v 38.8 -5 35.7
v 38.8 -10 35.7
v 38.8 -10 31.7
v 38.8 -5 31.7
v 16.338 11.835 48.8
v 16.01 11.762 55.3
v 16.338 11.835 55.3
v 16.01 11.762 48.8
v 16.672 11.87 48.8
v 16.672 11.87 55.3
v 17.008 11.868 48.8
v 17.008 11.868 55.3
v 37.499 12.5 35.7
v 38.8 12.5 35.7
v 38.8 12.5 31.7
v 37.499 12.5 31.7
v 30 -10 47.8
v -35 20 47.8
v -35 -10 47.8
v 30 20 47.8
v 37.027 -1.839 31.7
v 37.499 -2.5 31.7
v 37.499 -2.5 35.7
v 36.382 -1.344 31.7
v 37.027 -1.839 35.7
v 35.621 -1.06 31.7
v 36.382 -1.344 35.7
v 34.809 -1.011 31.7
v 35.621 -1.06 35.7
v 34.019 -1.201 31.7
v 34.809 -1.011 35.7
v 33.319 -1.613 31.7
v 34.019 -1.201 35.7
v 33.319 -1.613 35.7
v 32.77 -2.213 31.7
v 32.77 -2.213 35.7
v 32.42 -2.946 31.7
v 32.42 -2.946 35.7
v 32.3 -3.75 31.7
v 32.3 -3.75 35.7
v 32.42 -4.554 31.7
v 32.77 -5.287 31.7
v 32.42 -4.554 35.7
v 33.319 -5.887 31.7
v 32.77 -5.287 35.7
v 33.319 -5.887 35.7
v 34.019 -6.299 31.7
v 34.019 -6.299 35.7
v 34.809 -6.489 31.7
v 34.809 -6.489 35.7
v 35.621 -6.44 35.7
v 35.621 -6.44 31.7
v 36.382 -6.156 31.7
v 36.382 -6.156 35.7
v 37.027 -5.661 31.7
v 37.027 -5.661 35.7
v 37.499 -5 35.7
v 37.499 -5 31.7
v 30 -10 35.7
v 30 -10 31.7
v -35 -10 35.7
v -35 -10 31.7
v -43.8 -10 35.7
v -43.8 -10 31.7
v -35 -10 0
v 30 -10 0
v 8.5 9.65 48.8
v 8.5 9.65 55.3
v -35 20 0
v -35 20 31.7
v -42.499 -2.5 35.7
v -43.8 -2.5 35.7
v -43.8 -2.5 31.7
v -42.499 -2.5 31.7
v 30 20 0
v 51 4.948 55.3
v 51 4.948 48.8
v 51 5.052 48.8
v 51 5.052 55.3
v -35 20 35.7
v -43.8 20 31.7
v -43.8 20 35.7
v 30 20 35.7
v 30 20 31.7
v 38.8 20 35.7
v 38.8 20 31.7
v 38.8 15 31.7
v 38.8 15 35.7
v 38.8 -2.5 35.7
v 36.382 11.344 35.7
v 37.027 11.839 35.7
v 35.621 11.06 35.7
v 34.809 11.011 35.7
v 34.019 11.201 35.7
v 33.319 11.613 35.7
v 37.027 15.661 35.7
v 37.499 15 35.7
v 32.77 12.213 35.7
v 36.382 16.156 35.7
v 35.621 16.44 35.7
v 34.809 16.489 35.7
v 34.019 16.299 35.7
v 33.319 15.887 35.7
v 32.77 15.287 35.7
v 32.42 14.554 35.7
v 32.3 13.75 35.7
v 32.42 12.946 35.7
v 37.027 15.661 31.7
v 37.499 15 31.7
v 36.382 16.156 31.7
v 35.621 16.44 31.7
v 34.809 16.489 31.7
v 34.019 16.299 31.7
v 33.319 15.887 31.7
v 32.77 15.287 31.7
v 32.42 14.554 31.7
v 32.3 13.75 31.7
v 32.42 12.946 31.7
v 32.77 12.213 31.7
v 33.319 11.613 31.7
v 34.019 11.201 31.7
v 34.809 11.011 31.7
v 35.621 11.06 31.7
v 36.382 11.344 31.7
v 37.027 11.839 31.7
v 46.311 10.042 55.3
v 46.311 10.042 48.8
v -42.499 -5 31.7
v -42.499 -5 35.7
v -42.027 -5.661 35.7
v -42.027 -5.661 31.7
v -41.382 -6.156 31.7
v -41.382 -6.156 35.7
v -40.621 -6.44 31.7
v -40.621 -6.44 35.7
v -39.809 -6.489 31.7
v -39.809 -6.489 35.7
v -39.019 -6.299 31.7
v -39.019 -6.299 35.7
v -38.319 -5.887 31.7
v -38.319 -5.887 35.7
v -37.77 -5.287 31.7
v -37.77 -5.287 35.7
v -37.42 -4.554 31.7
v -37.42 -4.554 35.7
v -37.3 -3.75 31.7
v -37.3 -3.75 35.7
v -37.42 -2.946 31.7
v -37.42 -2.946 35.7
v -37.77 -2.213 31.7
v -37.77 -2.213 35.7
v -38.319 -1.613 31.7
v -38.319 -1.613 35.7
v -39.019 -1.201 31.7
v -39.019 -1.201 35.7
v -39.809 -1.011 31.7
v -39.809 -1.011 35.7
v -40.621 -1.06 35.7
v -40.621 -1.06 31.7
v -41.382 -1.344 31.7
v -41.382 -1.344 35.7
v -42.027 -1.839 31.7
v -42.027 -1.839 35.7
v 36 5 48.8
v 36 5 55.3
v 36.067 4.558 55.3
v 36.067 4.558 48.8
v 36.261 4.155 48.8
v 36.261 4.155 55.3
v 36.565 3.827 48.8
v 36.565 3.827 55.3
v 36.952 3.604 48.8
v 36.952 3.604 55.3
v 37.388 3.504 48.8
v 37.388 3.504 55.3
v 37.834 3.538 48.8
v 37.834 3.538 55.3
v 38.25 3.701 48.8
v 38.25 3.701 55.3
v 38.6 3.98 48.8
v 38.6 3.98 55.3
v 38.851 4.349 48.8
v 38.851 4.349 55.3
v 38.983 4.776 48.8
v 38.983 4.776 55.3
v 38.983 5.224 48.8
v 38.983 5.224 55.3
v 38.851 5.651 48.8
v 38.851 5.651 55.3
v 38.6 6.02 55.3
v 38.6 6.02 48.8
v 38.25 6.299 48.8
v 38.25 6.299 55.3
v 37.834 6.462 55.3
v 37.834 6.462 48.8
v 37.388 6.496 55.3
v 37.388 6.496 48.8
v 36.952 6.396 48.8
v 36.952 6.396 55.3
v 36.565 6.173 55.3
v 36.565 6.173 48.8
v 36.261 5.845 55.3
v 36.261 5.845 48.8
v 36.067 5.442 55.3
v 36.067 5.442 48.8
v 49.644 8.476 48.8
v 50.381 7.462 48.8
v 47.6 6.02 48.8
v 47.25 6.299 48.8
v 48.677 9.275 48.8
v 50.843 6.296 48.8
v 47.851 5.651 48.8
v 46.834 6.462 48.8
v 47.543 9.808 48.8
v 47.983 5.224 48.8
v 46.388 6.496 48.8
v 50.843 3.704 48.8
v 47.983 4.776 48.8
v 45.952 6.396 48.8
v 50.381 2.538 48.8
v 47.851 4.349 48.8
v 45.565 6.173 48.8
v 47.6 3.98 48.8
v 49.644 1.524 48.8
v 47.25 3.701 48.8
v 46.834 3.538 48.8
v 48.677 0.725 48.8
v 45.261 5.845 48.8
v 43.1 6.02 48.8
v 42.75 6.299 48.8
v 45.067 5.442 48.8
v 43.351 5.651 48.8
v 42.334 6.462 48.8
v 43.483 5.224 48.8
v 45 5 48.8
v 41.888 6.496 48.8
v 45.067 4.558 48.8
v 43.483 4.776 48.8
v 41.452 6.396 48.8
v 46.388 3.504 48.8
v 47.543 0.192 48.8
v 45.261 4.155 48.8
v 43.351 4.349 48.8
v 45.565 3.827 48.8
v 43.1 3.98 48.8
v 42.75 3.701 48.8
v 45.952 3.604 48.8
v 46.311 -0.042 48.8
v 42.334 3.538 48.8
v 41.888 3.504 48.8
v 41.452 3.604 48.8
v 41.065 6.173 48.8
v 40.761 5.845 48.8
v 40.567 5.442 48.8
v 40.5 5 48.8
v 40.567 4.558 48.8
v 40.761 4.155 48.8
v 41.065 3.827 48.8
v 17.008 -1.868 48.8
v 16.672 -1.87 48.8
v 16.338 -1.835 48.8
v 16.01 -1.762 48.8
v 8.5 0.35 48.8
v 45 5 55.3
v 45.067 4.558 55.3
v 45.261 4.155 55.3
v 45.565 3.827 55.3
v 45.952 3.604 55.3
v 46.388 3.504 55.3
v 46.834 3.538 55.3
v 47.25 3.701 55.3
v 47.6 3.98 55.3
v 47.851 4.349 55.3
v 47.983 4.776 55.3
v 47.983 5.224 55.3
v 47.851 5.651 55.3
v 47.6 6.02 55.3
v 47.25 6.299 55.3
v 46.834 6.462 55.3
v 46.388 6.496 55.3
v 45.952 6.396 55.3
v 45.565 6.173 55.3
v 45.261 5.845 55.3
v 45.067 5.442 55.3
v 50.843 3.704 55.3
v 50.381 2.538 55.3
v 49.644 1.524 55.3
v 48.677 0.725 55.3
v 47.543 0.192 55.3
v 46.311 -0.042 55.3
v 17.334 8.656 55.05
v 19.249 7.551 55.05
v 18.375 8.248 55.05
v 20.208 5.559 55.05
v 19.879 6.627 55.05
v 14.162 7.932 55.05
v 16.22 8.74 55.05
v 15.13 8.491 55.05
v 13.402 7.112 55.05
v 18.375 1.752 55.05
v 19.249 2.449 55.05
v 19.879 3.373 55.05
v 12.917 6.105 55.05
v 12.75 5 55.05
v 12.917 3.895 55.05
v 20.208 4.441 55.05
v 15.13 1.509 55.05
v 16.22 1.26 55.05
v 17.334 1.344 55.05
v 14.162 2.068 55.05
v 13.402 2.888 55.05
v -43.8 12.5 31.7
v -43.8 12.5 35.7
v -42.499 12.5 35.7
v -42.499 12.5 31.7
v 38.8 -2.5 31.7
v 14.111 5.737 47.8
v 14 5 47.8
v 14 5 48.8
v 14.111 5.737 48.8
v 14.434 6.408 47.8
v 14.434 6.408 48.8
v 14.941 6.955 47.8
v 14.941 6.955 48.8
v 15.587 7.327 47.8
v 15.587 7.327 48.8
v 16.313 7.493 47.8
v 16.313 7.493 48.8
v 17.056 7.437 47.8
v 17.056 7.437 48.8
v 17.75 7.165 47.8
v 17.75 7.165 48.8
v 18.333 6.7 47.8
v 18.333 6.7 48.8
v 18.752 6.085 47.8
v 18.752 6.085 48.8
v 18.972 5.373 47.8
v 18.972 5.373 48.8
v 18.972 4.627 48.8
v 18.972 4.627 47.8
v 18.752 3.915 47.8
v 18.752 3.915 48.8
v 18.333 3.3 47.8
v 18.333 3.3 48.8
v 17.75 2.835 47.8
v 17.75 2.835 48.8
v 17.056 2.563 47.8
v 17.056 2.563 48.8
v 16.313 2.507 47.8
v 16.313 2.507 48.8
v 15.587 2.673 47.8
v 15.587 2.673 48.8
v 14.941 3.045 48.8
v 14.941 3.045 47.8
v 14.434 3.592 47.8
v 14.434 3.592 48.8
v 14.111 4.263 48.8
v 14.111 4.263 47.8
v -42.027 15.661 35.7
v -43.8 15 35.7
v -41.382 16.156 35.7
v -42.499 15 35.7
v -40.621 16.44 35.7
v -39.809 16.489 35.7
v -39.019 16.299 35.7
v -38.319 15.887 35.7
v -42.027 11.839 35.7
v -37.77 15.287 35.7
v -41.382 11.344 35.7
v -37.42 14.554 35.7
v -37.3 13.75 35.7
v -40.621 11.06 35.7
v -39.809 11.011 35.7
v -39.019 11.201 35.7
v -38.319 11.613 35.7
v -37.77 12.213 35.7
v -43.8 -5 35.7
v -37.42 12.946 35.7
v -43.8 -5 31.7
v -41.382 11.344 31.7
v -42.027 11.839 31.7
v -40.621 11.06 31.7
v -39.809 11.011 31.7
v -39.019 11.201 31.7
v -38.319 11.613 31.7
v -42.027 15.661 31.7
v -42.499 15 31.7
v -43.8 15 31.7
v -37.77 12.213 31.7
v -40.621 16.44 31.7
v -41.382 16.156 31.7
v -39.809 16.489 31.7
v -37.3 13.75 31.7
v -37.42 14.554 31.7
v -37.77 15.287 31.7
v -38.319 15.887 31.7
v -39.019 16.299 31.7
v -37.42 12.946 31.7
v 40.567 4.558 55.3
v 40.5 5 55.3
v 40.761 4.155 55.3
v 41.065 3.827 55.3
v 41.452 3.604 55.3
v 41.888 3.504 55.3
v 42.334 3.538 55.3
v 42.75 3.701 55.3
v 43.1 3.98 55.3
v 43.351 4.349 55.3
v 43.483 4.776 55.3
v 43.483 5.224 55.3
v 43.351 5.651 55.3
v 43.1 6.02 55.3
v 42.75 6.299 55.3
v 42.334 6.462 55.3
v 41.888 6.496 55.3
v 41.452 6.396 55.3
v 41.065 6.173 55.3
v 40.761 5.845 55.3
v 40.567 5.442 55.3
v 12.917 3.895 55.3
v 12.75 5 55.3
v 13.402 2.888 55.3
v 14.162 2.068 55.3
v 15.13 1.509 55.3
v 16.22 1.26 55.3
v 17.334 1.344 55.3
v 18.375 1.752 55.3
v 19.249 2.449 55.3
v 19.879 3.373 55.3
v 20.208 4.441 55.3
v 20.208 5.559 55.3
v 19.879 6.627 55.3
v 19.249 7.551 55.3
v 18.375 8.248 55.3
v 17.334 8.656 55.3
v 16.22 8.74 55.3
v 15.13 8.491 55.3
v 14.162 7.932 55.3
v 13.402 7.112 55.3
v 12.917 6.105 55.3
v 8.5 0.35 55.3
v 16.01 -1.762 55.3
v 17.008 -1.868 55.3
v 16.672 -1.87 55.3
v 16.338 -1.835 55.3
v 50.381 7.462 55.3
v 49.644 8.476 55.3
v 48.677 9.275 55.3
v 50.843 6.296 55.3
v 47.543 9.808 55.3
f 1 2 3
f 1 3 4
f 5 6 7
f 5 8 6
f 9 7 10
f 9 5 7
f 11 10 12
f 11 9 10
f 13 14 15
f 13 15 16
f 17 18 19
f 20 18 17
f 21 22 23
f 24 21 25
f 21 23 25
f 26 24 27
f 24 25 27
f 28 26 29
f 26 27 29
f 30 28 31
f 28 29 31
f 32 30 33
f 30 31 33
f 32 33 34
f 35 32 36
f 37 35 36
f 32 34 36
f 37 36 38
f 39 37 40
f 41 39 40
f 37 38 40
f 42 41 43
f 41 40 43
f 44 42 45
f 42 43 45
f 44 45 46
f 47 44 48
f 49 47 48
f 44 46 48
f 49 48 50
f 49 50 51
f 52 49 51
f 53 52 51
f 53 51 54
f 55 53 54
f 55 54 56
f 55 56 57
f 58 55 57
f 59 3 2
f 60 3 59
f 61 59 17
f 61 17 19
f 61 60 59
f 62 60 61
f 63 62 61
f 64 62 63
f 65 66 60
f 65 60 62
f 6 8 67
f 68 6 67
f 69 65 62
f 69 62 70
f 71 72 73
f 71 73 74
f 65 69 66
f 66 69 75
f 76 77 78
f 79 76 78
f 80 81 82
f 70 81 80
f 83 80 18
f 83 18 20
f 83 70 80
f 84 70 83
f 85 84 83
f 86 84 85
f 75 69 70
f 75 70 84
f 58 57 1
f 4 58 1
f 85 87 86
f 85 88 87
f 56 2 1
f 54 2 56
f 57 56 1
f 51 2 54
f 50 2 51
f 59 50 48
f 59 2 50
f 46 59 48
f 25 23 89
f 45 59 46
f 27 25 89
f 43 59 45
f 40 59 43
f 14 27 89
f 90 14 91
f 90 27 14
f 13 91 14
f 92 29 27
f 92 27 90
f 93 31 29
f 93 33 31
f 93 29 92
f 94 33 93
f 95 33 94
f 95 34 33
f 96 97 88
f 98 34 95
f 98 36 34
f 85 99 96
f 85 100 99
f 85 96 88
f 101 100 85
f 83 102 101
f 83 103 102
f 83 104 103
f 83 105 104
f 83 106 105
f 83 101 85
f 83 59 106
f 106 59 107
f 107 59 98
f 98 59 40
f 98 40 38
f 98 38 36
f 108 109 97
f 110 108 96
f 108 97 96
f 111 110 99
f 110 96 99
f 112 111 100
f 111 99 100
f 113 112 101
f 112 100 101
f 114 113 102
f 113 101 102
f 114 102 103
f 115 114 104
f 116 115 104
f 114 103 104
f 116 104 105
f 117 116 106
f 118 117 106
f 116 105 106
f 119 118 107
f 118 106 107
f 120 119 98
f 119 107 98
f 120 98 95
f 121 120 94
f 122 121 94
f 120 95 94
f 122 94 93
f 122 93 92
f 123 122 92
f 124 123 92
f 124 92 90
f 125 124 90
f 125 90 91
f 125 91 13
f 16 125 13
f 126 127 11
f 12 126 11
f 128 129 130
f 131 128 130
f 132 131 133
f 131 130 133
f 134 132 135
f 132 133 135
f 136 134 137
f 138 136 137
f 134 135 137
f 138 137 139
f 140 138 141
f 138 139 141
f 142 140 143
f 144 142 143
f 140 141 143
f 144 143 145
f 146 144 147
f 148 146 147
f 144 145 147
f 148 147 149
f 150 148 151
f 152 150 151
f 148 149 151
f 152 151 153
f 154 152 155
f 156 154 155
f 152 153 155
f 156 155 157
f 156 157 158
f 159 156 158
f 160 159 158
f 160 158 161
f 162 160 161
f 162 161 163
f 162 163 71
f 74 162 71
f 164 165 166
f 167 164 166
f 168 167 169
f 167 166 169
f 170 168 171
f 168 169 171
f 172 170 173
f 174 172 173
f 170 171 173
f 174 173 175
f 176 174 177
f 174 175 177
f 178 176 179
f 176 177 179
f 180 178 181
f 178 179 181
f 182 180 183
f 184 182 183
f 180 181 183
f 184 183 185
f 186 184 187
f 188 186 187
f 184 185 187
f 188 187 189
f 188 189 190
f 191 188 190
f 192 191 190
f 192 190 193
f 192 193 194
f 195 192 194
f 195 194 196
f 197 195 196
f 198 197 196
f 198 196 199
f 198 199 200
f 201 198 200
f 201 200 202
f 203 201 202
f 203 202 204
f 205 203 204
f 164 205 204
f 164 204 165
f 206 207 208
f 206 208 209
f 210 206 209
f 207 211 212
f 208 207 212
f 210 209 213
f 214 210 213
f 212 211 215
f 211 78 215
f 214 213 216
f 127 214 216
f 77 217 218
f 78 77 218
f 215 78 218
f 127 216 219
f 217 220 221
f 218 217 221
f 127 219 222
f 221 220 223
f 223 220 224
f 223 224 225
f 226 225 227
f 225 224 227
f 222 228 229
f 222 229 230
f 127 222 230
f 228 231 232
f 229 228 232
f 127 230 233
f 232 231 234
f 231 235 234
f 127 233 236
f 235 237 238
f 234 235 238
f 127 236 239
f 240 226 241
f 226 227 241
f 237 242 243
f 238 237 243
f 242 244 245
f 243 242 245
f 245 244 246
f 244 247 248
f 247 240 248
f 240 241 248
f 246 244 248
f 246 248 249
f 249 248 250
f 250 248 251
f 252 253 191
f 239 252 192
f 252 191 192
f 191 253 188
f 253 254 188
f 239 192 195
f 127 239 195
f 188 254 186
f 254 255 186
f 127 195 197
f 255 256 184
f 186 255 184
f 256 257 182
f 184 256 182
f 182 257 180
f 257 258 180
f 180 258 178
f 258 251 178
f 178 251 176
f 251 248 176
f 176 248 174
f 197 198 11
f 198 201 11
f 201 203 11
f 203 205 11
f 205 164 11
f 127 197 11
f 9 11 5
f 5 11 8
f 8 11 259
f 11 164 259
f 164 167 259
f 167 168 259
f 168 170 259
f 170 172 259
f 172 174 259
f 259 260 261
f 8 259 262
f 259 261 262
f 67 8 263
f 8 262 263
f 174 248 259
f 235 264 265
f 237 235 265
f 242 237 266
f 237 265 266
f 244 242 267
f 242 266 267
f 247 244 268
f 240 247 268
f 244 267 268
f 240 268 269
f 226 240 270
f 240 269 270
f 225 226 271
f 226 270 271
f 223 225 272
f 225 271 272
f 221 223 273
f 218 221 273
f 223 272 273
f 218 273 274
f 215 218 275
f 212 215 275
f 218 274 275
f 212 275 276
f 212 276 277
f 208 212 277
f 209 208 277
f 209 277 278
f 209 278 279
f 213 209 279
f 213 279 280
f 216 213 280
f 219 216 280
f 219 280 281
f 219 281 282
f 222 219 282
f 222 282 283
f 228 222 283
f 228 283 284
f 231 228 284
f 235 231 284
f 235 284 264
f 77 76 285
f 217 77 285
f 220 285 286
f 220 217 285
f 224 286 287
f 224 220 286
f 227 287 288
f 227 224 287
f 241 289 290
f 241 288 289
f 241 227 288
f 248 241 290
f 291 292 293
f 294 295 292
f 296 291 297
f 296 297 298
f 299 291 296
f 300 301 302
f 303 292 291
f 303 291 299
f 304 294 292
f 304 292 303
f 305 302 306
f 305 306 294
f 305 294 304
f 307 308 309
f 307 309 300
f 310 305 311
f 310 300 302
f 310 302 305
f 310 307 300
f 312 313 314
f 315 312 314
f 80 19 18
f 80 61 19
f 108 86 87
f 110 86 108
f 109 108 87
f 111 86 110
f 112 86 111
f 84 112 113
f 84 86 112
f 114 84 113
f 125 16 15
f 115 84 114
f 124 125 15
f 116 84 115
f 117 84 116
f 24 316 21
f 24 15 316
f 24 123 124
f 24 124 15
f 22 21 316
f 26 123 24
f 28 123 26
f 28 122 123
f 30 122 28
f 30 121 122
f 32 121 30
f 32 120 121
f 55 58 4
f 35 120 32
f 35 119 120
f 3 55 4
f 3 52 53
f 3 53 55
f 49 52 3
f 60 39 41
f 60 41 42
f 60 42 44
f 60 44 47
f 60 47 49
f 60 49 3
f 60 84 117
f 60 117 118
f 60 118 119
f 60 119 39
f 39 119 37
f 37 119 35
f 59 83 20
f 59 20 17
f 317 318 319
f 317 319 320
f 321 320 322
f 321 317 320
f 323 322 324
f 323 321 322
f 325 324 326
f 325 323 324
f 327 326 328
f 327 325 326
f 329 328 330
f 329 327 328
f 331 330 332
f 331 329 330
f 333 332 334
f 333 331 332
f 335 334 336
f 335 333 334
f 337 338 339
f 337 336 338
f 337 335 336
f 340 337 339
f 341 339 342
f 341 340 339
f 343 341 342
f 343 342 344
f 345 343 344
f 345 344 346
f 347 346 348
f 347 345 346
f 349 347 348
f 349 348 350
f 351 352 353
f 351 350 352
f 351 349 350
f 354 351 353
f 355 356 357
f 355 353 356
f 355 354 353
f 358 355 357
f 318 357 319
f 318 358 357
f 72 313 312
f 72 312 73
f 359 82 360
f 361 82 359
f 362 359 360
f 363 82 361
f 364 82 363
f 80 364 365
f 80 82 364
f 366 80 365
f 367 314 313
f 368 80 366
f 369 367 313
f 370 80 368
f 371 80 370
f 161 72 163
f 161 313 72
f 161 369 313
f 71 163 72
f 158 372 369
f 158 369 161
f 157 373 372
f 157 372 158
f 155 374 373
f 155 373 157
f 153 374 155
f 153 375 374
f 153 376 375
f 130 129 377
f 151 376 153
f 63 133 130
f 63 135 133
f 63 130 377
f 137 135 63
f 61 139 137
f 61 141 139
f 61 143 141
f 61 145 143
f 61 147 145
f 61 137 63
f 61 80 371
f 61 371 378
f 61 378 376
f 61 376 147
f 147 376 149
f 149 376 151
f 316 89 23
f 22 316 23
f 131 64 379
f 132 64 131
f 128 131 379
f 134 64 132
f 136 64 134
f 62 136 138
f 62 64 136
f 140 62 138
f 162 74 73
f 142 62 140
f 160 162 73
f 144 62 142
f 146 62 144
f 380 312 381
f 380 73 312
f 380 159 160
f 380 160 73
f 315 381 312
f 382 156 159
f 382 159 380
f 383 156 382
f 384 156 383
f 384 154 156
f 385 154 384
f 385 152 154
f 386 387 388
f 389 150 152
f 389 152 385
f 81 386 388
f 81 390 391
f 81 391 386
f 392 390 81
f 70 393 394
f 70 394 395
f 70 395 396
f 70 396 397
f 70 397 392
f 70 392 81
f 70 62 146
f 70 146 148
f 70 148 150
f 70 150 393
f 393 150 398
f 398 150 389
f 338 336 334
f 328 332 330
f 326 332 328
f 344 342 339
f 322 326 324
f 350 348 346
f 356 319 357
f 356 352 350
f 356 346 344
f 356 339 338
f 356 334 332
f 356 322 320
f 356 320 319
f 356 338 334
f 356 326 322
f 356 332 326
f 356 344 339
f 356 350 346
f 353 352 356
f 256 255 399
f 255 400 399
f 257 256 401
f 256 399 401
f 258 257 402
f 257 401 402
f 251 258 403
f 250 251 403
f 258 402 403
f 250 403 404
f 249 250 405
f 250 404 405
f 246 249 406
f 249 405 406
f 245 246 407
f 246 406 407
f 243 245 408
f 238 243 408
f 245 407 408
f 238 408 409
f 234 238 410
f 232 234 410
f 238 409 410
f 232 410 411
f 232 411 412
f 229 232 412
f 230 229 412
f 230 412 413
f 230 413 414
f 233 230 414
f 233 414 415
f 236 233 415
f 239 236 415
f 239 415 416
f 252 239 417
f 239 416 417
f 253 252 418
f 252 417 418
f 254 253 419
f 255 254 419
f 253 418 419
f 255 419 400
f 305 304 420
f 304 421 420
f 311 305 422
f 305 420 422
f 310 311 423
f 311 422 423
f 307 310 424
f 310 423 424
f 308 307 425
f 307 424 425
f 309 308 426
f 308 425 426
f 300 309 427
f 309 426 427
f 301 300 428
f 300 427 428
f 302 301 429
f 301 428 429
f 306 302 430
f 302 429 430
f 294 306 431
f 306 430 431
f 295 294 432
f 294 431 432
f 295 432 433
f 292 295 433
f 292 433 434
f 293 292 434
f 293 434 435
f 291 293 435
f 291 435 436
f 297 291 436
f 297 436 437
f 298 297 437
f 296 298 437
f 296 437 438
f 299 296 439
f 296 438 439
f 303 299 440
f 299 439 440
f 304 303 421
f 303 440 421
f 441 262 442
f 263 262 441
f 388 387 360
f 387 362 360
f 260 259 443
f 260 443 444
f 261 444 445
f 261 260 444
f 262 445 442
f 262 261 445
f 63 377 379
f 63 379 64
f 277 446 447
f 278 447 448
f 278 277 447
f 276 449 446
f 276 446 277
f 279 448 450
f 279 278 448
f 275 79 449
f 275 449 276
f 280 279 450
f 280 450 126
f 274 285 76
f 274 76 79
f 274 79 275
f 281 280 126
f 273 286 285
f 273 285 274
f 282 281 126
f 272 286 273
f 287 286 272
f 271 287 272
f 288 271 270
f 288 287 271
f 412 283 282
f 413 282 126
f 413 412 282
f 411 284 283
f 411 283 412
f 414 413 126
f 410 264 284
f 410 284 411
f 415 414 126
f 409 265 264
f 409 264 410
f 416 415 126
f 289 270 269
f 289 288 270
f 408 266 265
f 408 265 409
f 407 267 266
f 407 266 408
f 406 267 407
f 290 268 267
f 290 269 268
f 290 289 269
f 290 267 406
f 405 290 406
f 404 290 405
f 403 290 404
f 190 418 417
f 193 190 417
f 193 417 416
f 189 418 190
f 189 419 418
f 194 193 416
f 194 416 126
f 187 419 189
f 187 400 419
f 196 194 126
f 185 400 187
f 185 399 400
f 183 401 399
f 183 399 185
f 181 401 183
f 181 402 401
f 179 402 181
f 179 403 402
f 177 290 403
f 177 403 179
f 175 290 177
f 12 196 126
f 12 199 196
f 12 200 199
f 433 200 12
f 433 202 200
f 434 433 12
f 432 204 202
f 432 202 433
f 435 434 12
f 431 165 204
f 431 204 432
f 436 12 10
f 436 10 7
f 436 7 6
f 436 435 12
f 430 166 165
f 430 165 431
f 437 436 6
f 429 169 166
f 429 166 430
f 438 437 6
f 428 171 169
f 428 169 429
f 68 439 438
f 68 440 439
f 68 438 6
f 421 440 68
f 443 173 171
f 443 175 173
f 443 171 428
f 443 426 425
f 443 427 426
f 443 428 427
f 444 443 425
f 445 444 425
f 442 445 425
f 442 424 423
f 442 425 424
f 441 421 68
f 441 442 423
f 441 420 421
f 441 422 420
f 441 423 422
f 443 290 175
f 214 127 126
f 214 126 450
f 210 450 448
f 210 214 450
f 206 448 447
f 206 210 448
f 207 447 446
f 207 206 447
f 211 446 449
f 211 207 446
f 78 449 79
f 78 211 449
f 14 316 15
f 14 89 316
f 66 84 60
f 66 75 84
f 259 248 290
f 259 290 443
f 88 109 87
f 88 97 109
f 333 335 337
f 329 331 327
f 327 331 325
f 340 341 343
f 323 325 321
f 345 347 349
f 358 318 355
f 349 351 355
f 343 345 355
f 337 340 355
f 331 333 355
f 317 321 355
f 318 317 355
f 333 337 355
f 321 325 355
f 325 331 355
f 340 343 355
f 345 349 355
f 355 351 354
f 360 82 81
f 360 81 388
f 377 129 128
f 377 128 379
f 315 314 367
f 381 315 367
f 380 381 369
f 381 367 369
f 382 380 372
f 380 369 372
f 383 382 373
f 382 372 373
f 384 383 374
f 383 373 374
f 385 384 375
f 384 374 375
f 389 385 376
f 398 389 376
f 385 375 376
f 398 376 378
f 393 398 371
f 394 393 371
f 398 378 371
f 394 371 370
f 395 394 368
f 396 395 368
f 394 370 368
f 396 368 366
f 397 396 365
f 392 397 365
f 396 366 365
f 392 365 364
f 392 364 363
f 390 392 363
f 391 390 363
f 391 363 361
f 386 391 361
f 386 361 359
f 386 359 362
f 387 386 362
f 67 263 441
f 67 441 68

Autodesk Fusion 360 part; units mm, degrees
sketch "Skizze1" plane through (0, 0, 0) normal (0, 0, 1) x (1, 0, 0)
  line L0 (-35, 20) -> (30, 20)
  line L1 (30, 20) -> (30, -10)
  line L2 (30, -10) -> (-35, -10)
  line L3 (-35, -10) -> (-35, 20)
  dimension "d1" = 65
  dimension "d2" = 30
extrude "Extrusion1" add sketch "Skizze1" along normal blind 47.8 makes body 1
sketch "Skizze4" plane through (-35, 0, 0) normal (-1, 0, 0) x (0, -1, 0)
  line L0 (-20, 0) -> (10, 0)
  line L1 (10, 0) -> (10, 47.8)
  line L2 (10, 47.8) -> (-20, 47.8)
  line L3 (-20, 47.8) -> (-20, 0)
  line L4 (-20, 35.7) -> (10, 35.7)
  line L5 (10, 35.7) -> (10, 31.7)
  line L6 (10, 31.7) -> (-20, 31.7)
  line L7 (-20, 31.7) -> (-20, 35.7)
  line L8 (10, 0) -> (-20, 0)
  line L9 (10, 35.7) -> (-20, 35.7)
  line L10 (-20, 35.7) -> (-20, 31.7)
  line L11 (-20, 31.7) -> (10, 31.7)
  line L12 (10, 31.7) -> (10, 35.7)
  dimension "d7" = 4
  dimension "d8" = 31.7
sketch "Skizze5" plane through (30, 0, 0) normal (1, 0, 0) x (0, 1, 0)
  line L0 (-10, 0) -> (20, 0)
  line L1 (20, 0) -> (20, 47.8)
  line L2 (20, 47.8) -> (-10, 47.8)
  line L3 (-10, 47.8) -> (-10, 0)
  line L4 (-10, 35.7) -> (20, 35.7)
  line L5 (20, 35.7) -> (20, 31.7)
  line L6 (20, 31.7) -> (-10, 31.7)
  line L7 (-10, 31.7) -> (-10, 35.7)
  line L8 (20, 0) -> (-10, 0)
  dimension "d9" = 4
  dimension "d10" = 31.7
extrude "Extrusion2" add sketch "Skizze4" along normal blind 8.8 contours L1 L3 L4 L5 L6 L7 L9 L10 L11 L12 bodies 1
extrude "Extrusion3" add sketch "Skizze5" along normal blind 8.8 contours L1 L3 L4 L5 L6 L7 bodies 1
copy_body "Körper->Berechn1" bodies 1 removing the originals makes body 2 in component "Corpus"
sketch "Skizze6" plane through (0, 0, 47.8) normal (0, 0, 1) x (-1, 0, 0)
  line L0 (35, 10) -> (-30, 10)
  line L1 (-30, 10) -> (-30, -20)
  line L2 (-30, -20) -> (35, -20)
  line L3 (35, -20) -> (35, 10)
  line L4 (-8.5, 10) -> (-8.5, -20) construction
  line L5 (35, 10) -> (35, -20)
  line L6 (-16.5, 10) -> (-16.5, -20) construction
  line L7 (-30, -5) -> (-7, -5) construction
  line L8 (-30, 10) -> (35, 10) construction
  circle A0 centre (-16.5, -5) radius 2.5
  circle A1 centre (-16.5, -5) radius 8.75 construction
  dimension "d15" = 43.5
  dimension "d16" = 8
  dimension "d17" = 15
  dimension "d18" = 5
  dimension "d19" = 17.5
extrude "Extrusion1'" add sketch "Skizze6" along normal blind 1 separate body contours A0 makes body 3 in component "Corpus"
sketch "Skizze7" plane through (0, 0, 47.8) normal (0, 0, 1) x (-1, 0, 0)
  line L0 (35, 10) -> (-30, 10)
  line L1 (-30, -20) -> (35, -20)
  line L2 (35, -20) -> (35, 10)
  line L3 (-51, 7) -> (-51, -5.0519) construction
  line L4 (-20, 1.9) -> (-13, 1.9) construction
  line L5 (-20, -11.9) -> (-13, -11.9) construction
  line L6 (-10, -0.35) -> (-7, -0.35) construction
  line L7 (-10, -9.65) -> (-7, -9.65) construction
  line L8 (-53, -0.25) -> (-49, -0.25) construction
  line L9 (-53, -9.75) -> (-49, -9.75) construction
  line L10 (-46.311, -10.0422) -> (-17.0084, -11.8683)
  line L11 (-46.311, 0.0422) -> (-17.0084, 1.8683)
  line L12 (-16.0096, 1.7621) -> (-8.5, -0.35)
  line L13 (-16.0096, -11.7621) -> (-8.5, -9.65)
  line L14 (-8.5, -0.35) -> (-8.5, -9.65)
  arc A0 (-51, -5.0519) -> (-46.311, -10.0422) centre (-46, -5.0519) ccw
  arc A1 (-46.311, 0.0422) -> (-51, -4.9481) centre (-46, -4.9481) ccw
  arc A2 (-17.0084, -11.8683) -> (-16.0096, -11.7621) centre (-16.8218, -8.8741) ccw
  arc A3 (-16.0096, 1.7621) -> (-17.0084, 1.8683) centre (-16.8218, -1.1259) ccw
  line L15 (-51, -4.9481) -> (-51, -5.0519)
  circle A4 centre (-16.5, -5) radius 2.5
  point P0 (-16.5, -5)
  dimension "d22" = 34.5
  dimension "d23" = 13.8
  dimension "d24" = 6.9
  dimension "d25" = 9.3
  dimension "d26" = 4.65
  dimension "d27" = 9.5
  dimension "d28" = 4.75
  dimension "d29" = 5
  dimension "d30" = 5
  dimension "d31" = 3
  dimension "d32" = 3
  dimension "d36" = 5
extrude "Extrusion4" add sketch "Skizze7" along normal blind 6.5 from surface at 1 separate body contours L10 L11 L12 L13 L14 A0 A1 A2 A3 L15 | A4 makes body 4
copy_body "Körper->Berechn2" bodies 4 removing the originals makes body 5 in component "Konnektor"
sketch "Skizze8" plane through (0, 0, 55.3) normal (0, 0, 1) x (-1, 0, 0)
  arc A0 (-46.311, 0.0422) -> (-51, -4.9481) centre (-46, -4.9481) ccw
  line L0 (-51, -4.9481) -> (-51, -5.0519)
  arc A1 (-51, -5.0519) -> (-46.311, -10.0422) centre (-46, -5.0519) ccw
  line L1 (-46.311, -10.0422) -> (-17.0084, -11.8683)
  arc A2 (-17.0084, -11.8683) -> (-16.0096, -11.7621) centre (-16.8218, -8.8741) ccw
  line L2 (-16.0096, -11.7621) -> (-8.5, -9.65)
  line L3 (-8.5, -9.65) -> (-8.5, -0.35)
  line L4 (-8.5, -0.35) -> (-16.0096, 1.7621)
  arc A3 (-16.0096, 1.7621) -> (-17.0084, 1.8683) centre (-16.8218, -1.1259) ccw
  line L5 (-17.0084, 1.8683) -> (-46.311, 0.0422)
  circle A4 centre (-16.5, -5) radius 2.5
  dimension "d41" = 5
sketch "Skizze9" plane through (0, 0, 35.7) normal (0, 0, 1) x (-1, 0, 0)
  line L0 (-30, -20) -> (-30, 10)
  line L1 (-30, 10) -> (-38.8, 10)
  line L2 (-38.8, 10) -> (-38.8, -20)
  line L3 (-38.8, -20) -> (-30, -20)
  circle A0 centre (-35.05, -13.75) radius 2.75
  line L4 (-38.8, -5) -> (-30, -5) construction
  circle A1 centre (-35.05, 3.75) radius 2.75
  line L5 (-38.8, -12.5) -> (-37.8, -12.5)
  line L6 (-37.8, -15) -> (-38.8, -15)
  line L7 (-38.8, -15) -> (-38.8, -12.5)
  line L8 (-38.8, -13.75) -> (-37.5, -13.75) construction
  line L9 (-37.8, -12.5) -> (-37, -12.5)
  line L10 (-37, -12.5) -> (-37, -15)
  line L11 (-37, -15) -> (-37.8, -15)
  line L12 (-37.8, 5) -> (-38.8, 5)
  line L13 (-38.8, 5) -> (-38.8, 2.5)
  line L14 (-38.8, 2.5) -> (-37.8, 2.5)
  line L15 (-37, 2.5) -> (-37, 5)
  line L16 (-37, 5) -> (-37.8, 5)
  line L17 (-37.8, 2.5) -> (-37, 2.5)
  line L18 (2.5, 10) -> (2.5, -20) construction
  circle A2 centre (40.05, 3.75) radius 2.75
  line L19 (42.8, 5) -> (43.8, 5)
  line L20 (43.8, 5) -> (43.8, 2.5)
  line L21 (42.8, 2.5) -> (42, 2.5)
  line L22 (42, 2.5) -> (42, 5)
  line L23 (42, 5) -> (42.8, 5)
  line L24 (43.8, 2.5) -> (42.8, 2.5)
  circle A3 centre (40.05, -13.75) radius 2.75
  line L25 (42.8, -15) -> (43.8, -15)
  line L26 (43.8, -15) -> (43.8, -12.5)
  line L27 (43.8, -12.5) -> (42.8, -12.5)
  line L28 (42.8, -12.5) -> (42, -12.5)
  line L29 (42, -15) -> (42.8, -15)
  line L30 (42, -12.5) -> (42, -15)
  dimension "d46" = 5.5
  dimension "d50" = 6.25
  dimension "d51" = 2.5
  dimension "d54" = 6.25
  dimension "d56" = 1.25
  dimension "d57" = 41.3
extrude "Extrusion2'" cut sketch "Skizze9" against normal blind 5 contours L2 A0 L5 L6 L7 L9 L11 | L2 A1 L12 L13 L14 L16 L17 | A0 L9 L10 L11 | A0 L9 L10 L11 | A1 L15 L16 L17 | A1 L15 L16 L17 | A2 L21 L22 L23 | A2 L19 L20 L21 L23 L24 | A2 L21 L22 L23 | A3 L28 L29 L30 | A3 L25 L26 L27 L28 L29 | A3 L28 L29 L30 bodies 2 in component "Corpus"
sketch "Skizze10" plane through (0, 0, 55.3) normal (0, 0, 1) x (-1, 0, 0)
  arc A0 (-46.311, 0.0422) -> (-51, -4.9481) centre (-46, -4.9481) ccw
  line L0 (-51, -4.9481) -> (-51, -5.0519)
  arc A1 (-51, -5.0519) -> (-46.311, -10.0422) centre (-46, -5.0519) ccw
  line L1 (-46.311, -10.0422) -> (-17.0084, -11.8683)
  arc A2 (-17.0084, -11.8683) -> (-16.0096, -11.7621) centre (-16.8218, -8.8741) ccw
  line L2 (-16.0096, -11.7621) -> (-8.5, -9.65)
  line L3 (-8.5, -9.65) -> (-8.5, -0.35)
  line L4 (-8.5, -0.35) -> (-16.0096, 1.7621)
  arc A3 (-16.0096, 1.7621) -> (-17.0084, 1.8683) centre (-16.8218, -1.1259) ccw
  line L5 (-17.0084, 1.8683) -> (-46.311, 0.0422)
  circle A4 centre (-46.5, -5) radius 1.5
  line L6 (-51, 0) -> (-51, -10.2733) construction
  circle A5 centre (-42, -5) radius 1.5
  circle A6 centre (-37.5, -5) radius 1.5
  circle A7 centre (-16.5, -5) radius 3.75
  dimension "d61" = 3
  dimension "d62" = 4.5
  dimension "d63" = 3
  dimension "d64" = 4.5
  dimension "d65" = 3
  dimension "d66" = 4.5
  dimension "d69" = 7.5
extrude "Extrusion1''" cut sketch "Skizze10" against normal blind 8 contours A4 | A5 | A6 bodies 5 in component "Konnektor"
extrude "Extrusion2''" cut sketch "Skizze10" against normal blind 0.25 contours A7 bodies 5 in component "Konnektor"
component "Corpus" placed x (1, 0, 0) y (0, 1, 0) z (0, 0, 1) at (0, 0, 0)
component "Konnektor" placed x (1, 0, 0) y (0, 1, 0) z (0, 0, 1) at (0, 0, 0)
